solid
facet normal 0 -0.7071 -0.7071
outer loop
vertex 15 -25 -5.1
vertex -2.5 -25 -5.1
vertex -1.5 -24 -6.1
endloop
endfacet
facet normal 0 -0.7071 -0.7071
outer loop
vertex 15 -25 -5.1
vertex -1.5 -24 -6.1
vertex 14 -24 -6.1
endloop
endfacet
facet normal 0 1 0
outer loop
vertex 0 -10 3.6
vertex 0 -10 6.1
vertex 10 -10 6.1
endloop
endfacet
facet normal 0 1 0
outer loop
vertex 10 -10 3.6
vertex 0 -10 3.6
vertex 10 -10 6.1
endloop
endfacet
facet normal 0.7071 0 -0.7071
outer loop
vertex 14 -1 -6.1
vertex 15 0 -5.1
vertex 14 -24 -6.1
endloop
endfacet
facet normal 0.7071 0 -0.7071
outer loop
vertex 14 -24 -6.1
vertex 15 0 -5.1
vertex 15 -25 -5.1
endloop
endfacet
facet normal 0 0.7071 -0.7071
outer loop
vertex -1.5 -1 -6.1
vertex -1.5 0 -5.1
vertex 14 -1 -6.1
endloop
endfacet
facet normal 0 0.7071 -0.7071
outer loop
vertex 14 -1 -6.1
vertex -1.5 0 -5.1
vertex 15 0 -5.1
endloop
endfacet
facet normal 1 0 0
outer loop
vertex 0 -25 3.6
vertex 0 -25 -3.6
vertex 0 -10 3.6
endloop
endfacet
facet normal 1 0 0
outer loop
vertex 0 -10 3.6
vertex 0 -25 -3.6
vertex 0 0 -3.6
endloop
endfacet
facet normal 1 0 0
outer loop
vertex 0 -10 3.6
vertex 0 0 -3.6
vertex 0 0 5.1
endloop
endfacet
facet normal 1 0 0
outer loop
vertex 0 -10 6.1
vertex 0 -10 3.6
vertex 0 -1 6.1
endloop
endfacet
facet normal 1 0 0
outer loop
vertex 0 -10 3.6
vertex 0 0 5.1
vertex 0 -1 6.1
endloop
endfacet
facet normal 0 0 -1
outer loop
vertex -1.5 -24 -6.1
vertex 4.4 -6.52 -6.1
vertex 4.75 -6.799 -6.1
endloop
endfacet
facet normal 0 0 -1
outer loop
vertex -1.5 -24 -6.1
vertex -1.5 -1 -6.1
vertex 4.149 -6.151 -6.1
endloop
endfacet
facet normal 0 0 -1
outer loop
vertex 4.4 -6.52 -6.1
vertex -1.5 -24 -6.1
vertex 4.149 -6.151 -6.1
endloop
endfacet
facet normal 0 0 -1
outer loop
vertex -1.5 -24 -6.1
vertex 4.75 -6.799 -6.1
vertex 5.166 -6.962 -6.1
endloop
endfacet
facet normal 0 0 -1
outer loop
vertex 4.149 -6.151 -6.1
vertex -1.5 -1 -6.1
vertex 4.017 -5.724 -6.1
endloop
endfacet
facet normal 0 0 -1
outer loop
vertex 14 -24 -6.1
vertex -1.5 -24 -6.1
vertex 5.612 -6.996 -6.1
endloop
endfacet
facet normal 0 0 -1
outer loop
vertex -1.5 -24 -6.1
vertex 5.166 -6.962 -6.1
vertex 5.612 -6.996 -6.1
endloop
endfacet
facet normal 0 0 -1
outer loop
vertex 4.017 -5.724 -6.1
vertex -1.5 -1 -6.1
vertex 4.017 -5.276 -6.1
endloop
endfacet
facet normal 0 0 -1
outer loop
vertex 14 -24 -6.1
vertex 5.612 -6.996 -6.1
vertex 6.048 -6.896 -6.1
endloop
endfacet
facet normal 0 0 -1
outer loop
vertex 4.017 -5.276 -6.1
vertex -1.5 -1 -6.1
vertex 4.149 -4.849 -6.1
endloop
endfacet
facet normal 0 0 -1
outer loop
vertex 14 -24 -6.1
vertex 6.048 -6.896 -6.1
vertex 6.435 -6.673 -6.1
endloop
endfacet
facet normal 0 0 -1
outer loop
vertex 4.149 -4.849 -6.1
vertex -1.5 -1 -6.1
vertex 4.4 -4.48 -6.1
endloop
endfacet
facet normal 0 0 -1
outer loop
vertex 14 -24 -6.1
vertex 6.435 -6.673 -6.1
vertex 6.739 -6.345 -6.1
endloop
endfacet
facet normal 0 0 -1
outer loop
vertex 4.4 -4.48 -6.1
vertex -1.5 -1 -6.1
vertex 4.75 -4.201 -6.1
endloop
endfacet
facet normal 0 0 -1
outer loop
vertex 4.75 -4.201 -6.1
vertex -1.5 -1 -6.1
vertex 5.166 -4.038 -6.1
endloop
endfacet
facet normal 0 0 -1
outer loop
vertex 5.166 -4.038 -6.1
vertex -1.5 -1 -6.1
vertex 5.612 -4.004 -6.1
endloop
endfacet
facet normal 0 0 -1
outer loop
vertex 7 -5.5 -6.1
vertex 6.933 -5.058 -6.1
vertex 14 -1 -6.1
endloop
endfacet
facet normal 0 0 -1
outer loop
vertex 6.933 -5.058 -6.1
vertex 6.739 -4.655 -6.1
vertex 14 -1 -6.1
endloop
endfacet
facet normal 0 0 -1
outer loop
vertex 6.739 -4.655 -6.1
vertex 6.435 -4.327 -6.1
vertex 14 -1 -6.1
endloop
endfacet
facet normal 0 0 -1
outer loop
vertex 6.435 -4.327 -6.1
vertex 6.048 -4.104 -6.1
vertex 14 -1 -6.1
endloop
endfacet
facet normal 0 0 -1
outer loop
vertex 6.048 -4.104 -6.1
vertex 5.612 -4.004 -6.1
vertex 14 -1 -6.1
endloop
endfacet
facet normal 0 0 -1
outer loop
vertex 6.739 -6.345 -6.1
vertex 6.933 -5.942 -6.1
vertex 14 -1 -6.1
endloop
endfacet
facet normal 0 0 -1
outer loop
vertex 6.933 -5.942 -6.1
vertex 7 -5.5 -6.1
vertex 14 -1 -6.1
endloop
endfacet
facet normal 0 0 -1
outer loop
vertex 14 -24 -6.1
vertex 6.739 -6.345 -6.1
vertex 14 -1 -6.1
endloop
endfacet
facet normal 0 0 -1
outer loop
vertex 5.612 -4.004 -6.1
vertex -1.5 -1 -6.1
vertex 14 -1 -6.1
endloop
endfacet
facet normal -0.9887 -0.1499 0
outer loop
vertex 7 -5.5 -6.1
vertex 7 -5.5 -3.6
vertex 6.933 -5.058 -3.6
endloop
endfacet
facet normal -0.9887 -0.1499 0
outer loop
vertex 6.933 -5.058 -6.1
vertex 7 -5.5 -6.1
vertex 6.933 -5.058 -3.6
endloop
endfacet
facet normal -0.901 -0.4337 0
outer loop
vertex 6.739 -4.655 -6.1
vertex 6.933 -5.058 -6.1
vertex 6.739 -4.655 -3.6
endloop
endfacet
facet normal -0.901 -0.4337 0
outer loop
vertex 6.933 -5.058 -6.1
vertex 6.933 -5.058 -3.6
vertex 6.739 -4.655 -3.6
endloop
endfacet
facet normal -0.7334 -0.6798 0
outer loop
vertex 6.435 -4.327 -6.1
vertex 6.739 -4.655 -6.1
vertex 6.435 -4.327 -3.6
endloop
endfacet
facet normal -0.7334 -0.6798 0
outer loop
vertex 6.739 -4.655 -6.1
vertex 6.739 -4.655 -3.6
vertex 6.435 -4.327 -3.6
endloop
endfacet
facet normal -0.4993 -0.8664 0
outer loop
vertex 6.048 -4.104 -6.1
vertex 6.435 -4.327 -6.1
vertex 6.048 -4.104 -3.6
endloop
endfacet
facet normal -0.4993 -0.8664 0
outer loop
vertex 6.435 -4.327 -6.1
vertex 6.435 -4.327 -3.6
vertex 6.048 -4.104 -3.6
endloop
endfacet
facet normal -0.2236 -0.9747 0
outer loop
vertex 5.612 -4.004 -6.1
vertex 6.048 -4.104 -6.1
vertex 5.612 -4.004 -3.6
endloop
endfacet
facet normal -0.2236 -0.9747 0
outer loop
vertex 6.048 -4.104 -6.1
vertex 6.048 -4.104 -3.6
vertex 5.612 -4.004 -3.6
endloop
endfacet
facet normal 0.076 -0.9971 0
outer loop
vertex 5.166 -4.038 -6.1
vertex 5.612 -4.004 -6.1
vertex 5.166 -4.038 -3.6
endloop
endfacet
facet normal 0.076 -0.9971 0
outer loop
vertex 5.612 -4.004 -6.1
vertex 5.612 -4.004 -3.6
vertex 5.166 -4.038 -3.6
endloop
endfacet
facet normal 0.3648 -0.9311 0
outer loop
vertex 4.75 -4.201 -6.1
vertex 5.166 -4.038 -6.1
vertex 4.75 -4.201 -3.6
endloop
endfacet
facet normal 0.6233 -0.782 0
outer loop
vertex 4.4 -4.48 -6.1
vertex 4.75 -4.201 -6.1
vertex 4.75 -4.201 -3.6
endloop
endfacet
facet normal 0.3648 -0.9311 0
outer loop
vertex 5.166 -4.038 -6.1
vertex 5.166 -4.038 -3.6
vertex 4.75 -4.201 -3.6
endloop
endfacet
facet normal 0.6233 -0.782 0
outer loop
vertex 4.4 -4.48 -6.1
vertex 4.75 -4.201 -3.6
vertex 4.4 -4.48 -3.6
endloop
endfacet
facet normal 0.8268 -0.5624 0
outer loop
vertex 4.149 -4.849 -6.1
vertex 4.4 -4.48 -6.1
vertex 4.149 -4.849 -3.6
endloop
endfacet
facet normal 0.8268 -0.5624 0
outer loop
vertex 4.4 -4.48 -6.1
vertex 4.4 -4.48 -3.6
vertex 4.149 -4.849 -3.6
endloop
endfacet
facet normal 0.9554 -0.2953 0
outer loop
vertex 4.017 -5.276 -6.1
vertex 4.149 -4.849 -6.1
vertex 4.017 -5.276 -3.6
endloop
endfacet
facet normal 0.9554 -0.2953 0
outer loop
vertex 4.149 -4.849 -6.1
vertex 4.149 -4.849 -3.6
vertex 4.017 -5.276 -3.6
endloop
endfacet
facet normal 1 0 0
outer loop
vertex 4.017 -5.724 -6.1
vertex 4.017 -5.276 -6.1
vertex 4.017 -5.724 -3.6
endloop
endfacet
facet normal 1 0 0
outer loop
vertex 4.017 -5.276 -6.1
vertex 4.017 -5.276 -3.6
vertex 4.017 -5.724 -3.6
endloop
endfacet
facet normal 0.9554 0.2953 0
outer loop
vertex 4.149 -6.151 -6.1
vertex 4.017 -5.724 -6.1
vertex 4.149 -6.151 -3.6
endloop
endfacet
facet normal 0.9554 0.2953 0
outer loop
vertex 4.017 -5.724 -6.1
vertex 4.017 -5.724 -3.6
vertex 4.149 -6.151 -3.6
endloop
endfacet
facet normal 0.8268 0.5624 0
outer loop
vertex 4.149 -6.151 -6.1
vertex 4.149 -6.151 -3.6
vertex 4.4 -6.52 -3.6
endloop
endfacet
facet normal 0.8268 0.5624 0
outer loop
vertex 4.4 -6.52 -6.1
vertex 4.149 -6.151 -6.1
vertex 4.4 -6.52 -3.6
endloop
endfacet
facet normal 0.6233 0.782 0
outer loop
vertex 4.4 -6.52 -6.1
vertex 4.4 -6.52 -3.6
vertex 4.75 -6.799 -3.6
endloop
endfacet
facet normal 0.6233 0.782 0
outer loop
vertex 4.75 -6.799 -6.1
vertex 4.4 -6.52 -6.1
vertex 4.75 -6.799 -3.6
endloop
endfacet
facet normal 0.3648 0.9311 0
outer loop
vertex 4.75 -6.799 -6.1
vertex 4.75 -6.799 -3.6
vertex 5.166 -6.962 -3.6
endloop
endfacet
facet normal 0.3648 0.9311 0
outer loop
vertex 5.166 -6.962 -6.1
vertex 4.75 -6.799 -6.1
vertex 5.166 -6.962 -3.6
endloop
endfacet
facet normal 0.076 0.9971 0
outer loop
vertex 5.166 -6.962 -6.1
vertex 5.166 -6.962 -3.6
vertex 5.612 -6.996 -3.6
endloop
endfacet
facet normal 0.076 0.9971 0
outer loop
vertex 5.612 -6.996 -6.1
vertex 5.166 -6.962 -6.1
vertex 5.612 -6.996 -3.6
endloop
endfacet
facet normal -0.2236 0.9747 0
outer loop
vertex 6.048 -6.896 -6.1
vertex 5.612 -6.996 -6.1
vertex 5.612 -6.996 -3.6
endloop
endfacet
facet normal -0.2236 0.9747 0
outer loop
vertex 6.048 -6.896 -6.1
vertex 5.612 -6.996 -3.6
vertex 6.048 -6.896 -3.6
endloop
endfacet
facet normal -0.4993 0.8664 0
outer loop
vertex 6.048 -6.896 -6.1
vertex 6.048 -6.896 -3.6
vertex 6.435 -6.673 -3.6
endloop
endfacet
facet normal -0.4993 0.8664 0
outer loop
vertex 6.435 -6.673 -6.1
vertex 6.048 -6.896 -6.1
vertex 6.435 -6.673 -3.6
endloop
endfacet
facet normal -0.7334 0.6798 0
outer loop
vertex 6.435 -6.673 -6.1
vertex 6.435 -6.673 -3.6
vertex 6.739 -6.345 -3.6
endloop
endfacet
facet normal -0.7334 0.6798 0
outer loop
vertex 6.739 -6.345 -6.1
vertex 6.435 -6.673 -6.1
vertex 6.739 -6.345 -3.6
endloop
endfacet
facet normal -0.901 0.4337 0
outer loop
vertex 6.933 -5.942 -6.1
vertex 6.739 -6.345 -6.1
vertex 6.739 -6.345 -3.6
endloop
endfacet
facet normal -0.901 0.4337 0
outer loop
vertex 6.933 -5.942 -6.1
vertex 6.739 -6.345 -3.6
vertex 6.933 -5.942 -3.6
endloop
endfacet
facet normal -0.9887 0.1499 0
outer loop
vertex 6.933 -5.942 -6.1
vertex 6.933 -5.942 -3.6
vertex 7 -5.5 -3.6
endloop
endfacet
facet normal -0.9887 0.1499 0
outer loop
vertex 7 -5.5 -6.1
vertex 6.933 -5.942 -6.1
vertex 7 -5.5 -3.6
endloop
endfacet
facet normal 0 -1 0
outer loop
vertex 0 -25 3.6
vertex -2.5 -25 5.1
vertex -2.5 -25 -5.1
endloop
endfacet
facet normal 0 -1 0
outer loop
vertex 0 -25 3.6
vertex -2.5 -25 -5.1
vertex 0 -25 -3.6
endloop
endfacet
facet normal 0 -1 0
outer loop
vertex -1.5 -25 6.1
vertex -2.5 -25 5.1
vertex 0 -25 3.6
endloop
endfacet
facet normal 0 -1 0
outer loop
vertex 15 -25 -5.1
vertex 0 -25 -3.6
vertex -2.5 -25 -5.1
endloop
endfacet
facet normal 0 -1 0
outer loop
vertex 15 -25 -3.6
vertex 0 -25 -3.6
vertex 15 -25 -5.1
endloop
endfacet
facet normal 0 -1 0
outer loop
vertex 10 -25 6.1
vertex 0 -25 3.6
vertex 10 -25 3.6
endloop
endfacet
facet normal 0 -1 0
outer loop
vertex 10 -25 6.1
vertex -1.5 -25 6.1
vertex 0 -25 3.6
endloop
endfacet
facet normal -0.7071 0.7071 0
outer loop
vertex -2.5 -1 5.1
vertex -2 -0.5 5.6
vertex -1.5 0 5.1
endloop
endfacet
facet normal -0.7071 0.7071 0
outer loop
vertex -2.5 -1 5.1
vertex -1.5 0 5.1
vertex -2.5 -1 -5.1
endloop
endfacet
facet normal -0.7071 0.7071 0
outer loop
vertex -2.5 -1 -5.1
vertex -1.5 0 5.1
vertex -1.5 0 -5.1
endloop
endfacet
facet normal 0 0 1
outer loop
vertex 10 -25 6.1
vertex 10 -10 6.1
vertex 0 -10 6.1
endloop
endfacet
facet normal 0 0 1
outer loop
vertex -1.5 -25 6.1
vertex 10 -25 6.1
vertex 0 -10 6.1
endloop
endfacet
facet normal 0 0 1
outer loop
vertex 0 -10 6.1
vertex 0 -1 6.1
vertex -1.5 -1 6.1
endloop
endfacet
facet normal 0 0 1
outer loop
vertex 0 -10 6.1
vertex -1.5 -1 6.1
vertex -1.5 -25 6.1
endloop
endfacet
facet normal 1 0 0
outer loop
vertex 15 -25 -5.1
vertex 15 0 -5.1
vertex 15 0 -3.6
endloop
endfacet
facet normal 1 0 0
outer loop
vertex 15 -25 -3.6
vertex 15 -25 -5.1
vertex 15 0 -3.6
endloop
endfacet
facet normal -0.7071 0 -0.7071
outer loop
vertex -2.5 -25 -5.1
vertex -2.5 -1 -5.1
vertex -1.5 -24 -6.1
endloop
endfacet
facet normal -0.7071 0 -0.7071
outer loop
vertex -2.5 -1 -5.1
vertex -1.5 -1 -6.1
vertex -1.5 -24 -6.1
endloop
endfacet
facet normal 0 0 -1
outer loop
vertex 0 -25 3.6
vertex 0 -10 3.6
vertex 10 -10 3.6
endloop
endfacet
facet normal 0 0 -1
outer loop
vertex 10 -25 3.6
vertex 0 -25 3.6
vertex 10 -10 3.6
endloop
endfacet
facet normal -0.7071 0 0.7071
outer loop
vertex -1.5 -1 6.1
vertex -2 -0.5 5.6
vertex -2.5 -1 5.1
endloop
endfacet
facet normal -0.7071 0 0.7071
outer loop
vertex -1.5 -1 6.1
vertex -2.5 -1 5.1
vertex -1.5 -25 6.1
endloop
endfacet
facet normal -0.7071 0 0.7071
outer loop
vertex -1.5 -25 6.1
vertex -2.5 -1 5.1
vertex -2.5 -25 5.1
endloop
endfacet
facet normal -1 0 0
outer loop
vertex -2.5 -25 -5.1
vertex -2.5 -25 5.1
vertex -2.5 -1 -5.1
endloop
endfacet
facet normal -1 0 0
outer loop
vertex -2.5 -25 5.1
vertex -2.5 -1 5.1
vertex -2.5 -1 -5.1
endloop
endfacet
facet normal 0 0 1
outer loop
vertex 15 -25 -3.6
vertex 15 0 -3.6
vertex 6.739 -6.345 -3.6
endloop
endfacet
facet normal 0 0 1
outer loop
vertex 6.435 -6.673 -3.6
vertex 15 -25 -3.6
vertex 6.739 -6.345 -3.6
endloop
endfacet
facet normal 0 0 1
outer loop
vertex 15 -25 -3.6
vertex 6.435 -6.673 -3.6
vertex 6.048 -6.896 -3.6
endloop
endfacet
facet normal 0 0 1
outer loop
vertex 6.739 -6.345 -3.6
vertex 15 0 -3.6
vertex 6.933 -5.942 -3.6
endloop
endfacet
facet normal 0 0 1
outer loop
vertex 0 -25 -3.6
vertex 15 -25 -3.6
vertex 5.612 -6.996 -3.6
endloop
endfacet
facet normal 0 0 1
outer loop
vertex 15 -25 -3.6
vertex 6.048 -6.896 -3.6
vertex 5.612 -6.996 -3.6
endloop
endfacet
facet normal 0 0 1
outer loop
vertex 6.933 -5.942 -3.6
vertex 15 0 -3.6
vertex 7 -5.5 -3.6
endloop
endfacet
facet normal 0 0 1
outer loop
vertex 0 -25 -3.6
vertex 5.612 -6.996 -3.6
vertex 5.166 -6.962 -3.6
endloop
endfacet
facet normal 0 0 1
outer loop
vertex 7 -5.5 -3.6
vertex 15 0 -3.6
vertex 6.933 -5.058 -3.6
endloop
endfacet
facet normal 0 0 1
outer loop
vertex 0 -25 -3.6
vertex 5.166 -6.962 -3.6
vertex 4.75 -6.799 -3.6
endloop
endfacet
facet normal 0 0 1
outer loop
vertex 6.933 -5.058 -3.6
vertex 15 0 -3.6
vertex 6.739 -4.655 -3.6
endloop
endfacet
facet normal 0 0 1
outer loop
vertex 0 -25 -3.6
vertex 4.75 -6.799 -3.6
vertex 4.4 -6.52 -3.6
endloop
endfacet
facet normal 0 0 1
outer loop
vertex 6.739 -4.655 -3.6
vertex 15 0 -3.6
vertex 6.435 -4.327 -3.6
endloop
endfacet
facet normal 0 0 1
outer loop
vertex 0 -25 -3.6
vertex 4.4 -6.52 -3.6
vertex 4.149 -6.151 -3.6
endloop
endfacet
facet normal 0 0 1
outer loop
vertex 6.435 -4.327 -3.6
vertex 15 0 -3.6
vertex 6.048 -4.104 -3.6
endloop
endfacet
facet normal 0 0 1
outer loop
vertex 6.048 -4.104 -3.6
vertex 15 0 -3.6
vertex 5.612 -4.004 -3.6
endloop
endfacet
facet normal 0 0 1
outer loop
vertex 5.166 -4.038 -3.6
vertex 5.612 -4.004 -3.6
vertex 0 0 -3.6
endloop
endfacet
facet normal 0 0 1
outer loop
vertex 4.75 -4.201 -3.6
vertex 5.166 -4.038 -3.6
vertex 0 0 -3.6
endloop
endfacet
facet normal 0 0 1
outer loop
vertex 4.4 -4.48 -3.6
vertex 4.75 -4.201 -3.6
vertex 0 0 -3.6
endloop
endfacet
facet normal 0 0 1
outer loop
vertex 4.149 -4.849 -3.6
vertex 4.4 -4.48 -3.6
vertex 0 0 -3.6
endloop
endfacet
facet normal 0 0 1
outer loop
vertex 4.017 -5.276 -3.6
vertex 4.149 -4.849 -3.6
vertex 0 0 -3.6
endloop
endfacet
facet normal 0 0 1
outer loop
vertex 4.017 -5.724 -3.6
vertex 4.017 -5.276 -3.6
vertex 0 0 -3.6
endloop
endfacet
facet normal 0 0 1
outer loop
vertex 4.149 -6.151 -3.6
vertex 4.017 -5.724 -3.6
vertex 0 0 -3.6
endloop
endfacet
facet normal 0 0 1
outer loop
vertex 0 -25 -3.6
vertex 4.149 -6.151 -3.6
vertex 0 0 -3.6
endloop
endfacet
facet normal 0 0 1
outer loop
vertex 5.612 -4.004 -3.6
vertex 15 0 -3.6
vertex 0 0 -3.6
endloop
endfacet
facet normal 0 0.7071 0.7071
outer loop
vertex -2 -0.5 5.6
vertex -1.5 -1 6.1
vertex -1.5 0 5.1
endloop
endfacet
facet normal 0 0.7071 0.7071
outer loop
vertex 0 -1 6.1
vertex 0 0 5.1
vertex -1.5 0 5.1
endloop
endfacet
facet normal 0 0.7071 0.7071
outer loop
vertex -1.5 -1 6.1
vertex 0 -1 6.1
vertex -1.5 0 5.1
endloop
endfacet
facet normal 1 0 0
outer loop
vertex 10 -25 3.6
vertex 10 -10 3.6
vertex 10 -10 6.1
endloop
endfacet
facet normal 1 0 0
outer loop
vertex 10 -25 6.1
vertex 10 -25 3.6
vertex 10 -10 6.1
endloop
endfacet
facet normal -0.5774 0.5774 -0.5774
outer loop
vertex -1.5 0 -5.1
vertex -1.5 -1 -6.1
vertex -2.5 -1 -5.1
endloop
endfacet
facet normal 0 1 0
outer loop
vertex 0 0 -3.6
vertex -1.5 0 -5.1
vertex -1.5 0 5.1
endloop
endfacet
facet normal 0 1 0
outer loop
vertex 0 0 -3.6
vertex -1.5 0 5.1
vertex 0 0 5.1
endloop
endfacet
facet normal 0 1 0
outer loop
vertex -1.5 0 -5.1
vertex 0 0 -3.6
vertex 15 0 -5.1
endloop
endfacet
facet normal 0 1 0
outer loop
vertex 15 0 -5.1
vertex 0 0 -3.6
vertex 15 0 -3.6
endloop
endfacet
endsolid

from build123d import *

# Parameters (mm, degrees)
F1_DEPTH = 25
F2_R     = 1.5
F3_DEPTH = 25
F4_W     = 10
F4_H     = 10
F4_R     = 1.5
F5_DEPTH = 5
F6_SIZE  = 1
F7_SIZE  = 1


with BuildPart() as f1:
    # F0 (on Front) → F1 (new body)
    with BuildSketch(Plane.XZ):
        Polygon((0, -3.6), (0, 3.6), (10, 3.6), (10, 6.1), (-2.5, 6.1), (-2.5, -6.1), (15, -6.1), (15, -3.6), align=None)
    extrude(amount=F1_DEPTH)

    # F2 (on face) → F3 (cut)
    with BuildSketch(Plane.XY.offset(6.1)):
        with Locations((5.5, -5.5)):
            Circle(F2_R)
    extrude(amount=-F3_DEPTH, mode=Mode.SUBTRACT)

    # F4 (on face) → F5 (cut)
    with BuildSketch(Plane.XY.offset(6.1)):
        with Locations((5, -5)):
            Rectangle(F4_W, F4_H)
        with Locations((5.5, -5.5)):
            Circle(F4_R, mode=Mode.SUBTRACT)
    extrude(amount=-F5_DEPTH, mode=Mode.SUBTRACT)

    # F6
    f6_edges = [f1.edges().sort_by_distance(p)[0] for p in [
        (-2.5, -12.5, 6.1),
        (-2.5, -12.5, -6.1),
        (15, -12.5, -6.1),
        (6.25, -25, -6.1),
        (6.25, 0, -6.1),
        (-2.5, 0, 0),
    ]]
    chamfer(f6_edges, length=F6_SIZE)

    # F7
    f7_edges = [f1.edges().sort_by_distance(p)[0] for p in [
        (-0.75, 0, 6.1),
    ]]
    chamfer(f7_edges, length=F7_SIZE)


solid = f1.part
